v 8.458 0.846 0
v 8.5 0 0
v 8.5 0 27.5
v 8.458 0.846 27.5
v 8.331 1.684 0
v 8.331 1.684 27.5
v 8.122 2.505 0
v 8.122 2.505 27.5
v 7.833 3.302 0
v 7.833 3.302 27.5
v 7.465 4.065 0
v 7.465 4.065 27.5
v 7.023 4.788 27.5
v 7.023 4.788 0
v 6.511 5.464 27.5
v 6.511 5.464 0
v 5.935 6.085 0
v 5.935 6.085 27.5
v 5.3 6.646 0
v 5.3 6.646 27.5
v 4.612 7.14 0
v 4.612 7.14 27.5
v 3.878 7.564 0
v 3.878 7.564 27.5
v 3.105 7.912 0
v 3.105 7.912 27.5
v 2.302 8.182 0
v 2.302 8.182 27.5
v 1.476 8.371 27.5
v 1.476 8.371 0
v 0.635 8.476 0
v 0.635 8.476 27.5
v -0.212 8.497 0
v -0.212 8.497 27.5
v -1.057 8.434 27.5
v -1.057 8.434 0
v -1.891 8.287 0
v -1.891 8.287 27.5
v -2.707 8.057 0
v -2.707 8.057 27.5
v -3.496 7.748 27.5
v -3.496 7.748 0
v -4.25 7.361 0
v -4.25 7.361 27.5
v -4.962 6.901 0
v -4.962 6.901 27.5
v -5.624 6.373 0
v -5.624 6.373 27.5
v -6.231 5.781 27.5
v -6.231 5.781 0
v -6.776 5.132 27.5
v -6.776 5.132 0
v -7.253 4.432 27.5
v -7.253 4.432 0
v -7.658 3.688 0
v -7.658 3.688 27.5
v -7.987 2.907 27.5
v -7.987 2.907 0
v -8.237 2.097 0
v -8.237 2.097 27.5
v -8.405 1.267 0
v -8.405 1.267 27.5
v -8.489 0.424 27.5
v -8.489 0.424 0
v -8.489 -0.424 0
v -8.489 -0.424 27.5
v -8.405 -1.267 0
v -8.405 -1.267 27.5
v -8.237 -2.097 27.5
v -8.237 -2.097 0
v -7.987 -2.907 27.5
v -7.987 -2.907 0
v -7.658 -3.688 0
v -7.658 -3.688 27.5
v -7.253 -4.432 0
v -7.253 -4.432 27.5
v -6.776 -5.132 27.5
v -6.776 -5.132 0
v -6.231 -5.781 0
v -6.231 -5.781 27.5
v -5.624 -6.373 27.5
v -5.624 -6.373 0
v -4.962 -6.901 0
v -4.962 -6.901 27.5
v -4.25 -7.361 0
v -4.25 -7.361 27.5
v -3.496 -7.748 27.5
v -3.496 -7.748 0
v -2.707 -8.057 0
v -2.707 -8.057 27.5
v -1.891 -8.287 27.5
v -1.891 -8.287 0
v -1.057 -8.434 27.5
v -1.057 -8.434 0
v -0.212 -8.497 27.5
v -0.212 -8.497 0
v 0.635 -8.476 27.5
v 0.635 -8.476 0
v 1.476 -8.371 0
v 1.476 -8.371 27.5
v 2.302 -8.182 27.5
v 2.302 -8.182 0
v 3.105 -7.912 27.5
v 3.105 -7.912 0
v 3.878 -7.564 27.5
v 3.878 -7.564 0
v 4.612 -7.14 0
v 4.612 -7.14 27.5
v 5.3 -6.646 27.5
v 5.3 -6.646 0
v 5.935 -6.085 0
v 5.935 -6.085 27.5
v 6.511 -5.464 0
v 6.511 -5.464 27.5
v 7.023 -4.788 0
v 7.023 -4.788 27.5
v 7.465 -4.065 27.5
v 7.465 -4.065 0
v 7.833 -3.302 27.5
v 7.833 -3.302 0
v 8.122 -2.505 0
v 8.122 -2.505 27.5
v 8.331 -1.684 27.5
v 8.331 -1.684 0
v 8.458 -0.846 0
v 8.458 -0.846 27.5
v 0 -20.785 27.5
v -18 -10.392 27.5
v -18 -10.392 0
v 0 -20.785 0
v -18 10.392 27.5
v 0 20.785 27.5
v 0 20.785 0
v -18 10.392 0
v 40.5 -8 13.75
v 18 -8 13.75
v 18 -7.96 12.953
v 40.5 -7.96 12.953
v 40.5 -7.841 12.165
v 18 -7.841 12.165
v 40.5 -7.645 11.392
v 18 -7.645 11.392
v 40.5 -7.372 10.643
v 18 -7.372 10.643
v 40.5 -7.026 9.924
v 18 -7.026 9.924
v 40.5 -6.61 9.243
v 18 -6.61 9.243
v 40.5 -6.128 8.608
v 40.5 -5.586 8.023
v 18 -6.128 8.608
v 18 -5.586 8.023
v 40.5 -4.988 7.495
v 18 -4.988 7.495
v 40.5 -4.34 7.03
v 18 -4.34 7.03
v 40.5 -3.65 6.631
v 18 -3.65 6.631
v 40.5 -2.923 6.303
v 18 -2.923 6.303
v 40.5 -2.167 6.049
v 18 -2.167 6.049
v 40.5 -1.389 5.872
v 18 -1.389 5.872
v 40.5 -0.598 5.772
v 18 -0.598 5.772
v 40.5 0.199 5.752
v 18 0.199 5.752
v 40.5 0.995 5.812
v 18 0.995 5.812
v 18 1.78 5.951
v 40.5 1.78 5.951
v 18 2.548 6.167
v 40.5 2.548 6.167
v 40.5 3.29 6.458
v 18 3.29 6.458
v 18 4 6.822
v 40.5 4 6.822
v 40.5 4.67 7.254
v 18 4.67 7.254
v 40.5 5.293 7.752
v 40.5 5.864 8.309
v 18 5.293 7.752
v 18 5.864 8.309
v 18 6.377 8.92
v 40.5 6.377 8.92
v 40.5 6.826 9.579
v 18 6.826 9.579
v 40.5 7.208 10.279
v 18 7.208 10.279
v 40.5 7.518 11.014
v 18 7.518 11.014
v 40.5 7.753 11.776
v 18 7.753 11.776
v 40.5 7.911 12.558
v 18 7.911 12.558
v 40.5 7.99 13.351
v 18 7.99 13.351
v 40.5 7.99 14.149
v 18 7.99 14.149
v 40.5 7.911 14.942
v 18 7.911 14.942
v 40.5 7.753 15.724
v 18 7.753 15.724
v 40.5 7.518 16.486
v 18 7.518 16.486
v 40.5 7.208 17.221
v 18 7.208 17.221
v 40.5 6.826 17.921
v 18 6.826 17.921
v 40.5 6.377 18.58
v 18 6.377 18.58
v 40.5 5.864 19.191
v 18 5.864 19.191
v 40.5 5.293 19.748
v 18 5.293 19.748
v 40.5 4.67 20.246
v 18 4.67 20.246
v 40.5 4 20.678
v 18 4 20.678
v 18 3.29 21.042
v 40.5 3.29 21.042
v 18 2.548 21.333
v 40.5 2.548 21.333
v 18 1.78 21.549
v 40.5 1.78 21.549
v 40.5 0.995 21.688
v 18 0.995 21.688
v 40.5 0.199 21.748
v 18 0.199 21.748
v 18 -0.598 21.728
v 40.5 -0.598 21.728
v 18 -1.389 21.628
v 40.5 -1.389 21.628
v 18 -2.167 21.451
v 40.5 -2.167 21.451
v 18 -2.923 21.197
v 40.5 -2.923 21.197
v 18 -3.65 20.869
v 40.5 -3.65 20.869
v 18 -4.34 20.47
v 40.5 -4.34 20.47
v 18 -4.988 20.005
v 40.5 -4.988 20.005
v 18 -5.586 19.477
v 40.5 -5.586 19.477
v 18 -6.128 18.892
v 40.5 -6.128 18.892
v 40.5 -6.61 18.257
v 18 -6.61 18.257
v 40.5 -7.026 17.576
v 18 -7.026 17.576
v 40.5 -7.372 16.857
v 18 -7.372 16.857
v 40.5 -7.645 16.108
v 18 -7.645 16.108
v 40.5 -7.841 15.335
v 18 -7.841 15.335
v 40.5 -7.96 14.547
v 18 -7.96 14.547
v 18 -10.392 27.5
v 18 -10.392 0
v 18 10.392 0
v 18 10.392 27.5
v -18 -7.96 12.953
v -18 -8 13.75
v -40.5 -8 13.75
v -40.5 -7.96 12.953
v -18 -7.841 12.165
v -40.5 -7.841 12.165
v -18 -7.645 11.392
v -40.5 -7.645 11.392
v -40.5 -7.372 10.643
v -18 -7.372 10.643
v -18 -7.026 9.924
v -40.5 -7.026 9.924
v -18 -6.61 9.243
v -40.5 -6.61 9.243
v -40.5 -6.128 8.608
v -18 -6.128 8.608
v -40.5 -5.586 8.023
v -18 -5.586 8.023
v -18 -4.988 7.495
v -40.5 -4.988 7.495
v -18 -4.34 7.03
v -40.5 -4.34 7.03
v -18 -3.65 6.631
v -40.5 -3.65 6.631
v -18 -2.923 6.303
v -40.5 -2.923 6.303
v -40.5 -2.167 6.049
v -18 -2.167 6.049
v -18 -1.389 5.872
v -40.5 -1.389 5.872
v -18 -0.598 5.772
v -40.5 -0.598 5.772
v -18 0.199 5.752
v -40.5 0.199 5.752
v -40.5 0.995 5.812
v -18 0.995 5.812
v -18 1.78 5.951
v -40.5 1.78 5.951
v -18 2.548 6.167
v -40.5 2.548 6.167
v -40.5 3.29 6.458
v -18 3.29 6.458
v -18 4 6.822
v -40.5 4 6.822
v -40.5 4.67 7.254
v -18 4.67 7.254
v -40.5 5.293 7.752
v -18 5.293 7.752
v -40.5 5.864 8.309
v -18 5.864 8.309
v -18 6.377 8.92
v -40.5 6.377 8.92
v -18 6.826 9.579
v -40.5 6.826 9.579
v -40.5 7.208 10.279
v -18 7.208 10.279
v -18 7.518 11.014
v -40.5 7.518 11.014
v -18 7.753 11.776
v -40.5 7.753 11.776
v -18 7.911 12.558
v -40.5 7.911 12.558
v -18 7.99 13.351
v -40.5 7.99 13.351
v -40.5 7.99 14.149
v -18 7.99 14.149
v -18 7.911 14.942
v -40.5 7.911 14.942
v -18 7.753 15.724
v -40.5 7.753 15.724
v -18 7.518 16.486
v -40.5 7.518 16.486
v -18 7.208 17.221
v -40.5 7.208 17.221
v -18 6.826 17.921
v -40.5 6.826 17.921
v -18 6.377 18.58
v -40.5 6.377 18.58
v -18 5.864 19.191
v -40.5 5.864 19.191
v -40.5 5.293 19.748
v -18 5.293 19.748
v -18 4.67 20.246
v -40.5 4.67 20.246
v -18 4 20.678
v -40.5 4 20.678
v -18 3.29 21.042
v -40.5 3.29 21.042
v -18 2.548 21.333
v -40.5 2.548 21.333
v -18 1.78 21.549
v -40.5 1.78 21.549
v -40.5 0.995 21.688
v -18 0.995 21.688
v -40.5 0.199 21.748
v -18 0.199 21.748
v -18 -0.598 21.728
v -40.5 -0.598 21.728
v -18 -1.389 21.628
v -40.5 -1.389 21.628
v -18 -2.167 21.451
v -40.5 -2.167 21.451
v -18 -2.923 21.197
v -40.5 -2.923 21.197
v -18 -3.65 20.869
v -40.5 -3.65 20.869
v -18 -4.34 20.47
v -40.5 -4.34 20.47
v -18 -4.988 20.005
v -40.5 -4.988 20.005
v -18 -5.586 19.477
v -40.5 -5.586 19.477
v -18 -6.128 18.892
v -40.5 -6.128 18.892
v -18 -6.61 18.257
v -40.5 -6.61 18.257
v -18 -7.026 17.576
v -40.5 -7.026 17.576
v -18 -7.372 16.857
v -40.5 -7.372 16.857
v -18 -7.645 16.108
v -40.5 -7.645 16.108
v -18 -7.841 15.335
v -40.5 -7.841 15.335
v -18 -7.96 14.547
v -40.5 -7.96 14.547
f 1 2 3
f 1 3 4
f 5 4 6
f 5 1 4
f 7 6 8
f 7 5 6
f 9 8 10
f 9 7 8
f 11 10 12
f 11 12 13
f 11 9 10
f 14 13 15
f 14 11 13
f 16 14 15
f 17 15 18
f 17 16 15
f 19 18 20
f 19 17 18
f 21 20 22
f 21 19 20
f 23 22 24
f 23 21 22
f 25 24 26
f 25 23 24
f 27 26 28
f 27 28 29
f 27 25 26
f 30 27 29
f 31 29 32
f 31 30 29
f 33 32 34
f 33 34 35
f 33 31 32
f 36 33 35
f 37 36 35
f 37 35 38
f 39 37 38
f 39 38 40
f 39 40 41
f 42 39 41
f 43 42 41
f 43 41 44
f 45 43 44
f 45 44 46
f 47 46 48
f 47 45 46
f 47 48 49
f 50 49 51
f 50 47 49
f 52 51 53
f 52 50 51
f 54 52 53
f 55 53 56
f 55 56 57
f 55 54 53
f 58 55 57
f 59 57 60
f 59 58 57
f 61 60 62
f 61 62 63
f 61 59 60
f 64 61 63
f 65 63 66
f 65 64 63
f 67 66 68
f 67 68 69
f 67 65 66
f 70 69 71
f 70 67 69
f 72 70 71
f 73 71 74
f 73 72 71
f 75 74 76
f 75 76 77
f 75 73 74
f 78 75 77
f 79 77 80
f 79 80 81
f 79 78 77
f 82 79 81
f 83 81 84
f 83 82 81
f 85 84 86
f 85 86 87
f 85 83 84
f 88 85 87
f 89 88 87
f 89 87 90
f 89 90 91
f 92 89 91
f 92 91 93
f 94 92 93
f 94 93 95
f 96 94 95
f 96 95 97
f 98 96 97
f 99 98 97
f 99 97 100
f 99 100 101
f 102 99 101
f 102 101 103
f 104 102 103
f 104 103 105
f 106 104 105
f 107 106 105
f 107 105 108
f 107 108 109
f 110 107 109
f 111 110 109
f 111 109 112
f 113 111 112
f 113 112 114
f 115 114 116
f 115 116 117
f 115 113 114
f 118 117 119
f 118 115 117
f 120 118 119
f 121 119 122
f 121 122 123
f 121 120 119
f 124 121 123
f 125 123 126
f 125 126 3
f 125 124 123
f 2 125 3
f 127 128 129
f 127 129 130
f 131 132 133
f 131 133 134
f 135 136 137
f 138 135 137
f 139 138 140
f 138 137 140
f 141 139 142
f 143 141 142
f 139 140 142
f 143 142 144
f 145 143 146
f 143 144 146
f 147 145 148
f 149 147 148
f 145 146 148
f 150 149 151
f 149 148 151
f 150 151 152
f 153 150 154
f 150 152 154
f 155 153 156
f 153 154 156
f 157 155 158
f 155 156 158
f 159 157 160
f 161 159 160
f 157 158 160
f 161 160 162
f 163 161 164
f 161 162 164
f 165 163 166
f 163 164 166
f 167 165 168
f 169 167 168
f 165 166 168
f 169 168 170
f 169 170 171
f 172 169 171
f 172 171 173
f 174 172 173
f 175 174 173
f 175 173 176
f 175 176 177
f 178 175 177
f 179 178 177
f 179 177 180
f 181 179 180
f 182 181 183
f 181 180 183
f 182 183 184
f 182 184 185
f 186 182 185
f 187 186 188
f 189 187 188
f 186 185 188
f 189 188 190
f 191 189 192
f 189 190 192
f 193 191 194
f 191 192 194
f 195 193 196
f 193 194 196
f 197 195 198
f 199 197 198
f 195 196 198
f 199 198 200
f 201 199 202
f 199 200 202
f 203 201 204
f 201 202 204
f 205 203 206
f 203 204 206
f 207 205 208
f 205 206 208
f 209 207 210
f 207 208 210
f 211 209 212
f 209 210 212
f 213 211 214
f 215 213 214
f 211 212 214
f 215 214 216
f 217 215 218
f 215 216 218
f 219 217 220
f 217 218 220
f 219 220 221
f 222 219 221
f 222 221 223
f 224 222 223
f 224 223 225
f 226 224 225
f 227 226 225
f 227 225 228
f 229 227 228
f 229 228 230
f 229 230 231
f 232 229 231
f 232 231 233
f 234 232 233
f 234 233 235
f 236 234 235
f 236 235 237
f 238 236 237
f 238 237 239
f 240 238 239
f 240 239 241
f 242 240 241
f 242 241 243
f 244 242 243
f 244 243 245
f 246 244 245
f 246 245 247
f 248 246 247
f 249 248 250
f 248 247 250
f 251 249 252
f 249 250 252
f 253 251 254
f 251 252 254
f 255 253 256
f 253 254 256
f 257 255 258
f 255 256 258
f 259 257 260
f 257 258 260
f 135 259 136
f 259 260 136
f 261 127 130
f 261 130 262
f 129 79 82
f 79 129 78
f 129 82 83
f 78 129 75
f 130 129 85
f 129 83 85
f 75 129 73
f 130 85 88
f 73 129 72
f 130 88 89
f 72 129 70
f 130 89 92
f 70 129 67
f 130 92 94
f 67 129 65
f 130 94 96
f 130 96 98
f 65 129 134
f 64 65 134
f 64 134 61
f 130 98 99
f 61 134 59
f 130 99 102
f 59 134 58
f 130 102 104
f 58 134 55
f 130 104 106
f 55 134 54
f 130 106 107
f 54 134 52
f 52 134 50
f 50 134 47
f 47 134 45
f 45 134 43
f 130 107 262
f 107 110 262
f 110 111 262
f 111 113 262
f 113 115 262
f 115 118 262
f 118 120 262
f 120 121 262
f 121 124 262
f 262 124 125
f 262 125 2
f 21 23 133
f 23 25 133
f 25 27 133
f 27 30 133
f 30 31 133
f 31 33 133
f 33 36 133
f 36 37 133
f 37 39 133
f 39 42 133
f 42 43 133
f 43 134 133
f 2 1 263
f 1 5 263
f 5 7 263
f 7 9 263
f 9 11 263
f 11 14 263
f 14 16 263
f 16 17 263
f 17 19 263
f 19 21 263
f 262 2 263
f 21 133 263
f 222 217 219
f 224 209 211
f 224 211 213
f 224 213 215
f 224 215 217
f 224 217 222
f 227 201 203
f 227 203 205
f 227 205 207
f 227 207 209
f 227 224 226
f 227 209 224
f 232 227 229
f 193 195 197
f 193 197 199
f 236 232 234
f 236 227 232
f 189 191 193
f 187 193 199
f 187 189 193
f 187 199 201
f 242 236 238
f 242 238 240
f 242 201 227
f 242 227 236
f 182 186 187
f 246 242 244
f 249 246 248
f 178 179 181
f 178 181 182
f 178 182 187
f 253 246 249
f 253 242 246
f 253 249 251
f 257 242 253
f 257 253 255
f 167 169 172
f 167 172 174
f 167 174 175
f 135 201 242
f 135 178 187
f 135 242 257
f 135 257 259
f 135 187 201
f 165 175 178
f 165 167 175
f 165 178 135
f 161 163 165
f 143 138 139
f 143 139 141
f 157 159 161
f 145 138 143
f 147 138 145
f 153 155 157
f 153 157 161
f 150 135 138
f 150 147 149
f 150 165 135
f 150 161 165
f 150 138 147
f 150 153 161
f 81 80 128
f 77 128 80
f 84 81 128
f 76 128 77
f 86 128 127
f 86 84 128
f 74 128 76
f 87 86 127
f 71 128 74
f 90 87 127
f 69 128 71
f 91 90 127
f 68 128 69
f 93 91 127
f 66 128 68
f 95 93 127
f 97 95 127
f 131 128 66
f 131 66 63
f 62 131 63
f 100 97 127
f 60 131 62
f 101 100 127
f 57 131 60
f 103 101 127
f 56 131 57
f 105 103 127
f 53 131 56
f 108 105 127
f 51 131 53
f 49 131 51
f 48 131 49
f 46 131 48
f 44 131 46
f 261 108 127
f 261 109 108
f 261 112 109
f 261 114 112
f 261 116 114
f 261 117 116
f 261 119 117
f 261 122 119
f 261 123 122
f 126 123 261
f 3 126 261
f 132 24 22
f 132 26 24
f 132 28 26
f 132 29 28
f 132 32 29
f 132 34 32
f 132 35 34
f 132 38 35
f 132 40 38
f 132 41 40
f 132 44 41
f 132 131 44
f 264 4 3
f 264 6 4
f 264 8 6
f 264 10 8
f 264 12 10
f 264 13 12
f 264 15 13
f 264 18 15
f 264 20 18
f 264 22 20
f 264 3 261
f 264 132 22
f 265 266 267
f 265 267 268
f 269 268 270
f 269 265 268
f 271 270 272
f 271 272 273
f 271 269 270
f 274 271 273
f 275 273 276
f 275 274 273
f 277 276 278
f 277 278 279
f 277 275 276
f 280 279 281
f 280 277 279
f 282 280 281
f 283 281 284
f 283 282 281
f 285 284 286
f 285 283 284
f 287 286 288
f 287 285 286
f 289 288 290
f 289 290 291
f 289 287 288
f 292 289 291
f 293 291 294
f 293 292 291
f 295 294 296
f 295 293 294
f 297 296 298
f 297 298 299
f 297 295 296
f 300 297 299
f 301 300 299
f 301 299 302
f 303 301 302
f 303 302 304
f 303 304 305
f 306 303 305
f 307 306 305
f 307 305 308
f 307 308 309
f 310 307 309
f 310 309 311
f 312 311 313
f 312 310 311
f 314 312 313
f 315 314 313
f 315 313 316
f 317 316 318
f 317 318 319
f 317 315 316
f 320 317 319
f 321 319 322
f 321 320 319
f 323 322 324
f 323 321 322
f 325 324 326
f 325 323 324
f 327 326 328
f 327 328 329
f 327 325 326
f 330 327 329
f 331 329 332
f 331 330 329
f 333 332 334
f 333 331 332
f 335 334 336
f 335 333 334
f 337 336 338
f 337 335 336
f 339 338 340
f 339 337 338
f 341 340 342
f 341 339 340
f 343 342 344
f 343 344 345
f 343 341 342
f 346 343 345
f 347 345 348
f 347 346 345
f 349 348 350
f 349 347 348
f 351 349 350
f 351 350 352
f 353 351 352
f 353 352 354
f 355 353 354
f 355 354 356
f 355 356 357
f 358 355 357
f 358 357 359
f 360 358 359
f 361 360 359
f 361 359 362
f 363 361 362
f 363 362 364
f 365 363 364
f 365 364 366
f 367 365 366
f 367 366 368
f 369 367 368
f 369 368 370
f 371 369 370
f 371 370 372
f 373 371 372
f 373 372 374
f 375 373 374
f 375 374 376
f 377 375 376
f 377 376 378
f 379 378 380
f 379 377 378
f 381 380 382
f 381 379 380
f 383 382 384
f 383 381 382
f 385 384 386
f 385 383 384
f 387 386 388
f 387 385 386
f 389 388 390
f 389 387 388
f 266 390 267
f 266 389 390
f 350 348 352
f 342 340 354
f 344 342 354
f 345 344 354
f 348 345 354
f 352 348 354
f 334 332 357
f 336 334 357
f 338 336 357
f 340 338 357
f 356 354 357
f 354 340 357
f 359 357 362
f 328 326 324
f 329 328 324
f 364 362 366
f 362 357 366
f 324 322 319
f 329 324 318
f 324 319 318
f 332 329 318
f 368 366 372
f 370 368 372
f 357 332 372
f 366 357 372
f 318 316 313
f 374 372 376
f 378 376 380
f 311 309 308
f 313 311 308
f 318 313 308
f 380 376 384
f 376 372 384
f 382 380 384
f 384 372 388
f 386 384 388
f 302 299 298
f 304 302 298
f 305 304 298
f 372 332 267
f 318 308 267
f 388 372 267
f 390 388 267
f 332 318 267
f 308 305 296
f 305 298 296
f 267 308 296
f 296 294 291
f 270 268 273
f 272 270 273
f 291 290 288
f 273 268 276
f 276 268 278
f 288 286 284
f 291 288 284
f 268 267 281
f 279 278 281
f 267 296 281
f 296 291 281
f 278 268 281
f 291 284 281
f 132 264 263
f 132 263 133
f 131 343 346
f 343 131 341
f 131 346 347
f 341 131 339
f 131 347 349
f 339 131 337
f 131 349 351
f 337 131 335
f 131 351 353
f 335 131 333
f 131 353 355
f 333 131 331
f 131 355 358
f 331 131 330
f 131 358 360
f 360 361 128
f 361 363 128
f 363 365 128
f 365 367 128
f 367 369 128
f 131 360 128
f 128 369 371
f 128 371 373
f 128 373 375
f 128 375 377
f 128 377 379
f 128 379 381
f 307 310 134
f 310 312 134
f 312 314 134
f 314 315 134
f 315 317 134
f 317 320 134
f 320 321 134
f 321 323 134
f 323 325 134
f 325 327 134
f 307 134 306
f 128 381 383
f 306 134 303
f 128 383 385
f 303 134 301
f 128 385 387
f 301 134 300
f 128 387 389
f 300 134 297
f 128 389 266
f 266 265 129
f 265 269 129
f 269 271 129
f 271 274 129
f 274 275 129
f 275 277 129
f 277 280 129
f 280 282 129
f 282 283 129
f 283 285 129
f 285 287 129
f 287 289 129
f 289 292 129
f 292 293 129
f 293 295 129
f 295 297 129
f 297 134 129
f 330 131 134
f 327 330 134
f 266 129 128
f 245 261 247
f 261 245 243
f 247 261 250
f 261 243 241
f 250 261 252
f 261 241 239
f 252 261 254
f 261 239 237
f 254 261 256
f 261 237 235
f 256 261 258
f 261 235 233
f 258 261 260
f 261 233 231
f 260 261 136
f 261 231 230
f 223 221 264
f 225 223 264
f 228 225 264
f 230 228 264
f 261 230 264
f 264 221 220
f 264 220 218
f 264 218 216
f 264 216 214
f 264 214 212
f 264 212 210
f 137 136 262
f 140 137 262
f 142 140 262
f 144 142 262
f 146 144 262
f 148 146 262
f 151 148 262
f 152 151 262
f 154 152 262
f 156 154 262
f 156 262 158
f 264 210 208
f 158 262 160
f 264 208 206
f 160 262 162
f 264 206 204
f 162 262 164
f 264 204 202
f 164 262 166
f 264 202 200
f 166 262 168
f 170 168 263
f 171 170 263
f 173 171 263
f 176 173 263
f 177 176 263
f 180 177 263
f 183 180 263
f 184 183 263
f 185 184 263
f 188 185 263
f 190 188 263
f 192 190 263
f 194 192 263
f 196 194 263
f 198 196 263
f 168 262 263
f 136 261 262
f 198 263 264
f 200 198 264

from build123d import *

# Parameters (mm, degrees)
IZIM1_R                     = 8.5
Y_KSEKLIK_EKSTR_ZYON1_DEPTH = 27.5
IZIM2_R                     = 8
Y_KSEKLIK_EKSTR_ZYON3_DEPTH = 22.5


with BuildPart() as part:
    # Çizim1 → Yükseklik-Ekstrüzyon1 (new body)
    with BuildSketch(Plane.XY):
        Polygon((0, 20.784609691), (-18, 10.392304845), (-18, -10.392304845), (0, -20.784609691), (18, -10.392304845), (18, 10.392304845), align=None)
        Circle(IZIM1_R, mode=Mode.SUBTRACT)
    extrude(amount=Y_KSEKLIK_EKSTR_ZYON1_DEPTH)

    # Çizim2 → Yükseklik-Ekstrüzyon3 (add)
    with BuildSketch(Plane(origin=(18, 0, 0), x_dir=(0, 0, -1), z_dir=(1, 0, 0))):
        with Locations(Location((-13.75, 0, 0), (0, 0, 270))):
            Circle(IZIM2_R)
    y_kseklik_ekstr_zyon3 = extrude(amount=Y_KSEKLIK_EKSTR_ZYON3_DEPTH)

    # Aynalama1: Yükseklik-Ekstrüzyon3 across plane
    add(y_kseklik_ekstr_zyon3.mirror(Plane(origin=(0, 0, 0), x_dir=(0, 0, 1), z_dir=(1, 0, 0))))


solid = part.part
